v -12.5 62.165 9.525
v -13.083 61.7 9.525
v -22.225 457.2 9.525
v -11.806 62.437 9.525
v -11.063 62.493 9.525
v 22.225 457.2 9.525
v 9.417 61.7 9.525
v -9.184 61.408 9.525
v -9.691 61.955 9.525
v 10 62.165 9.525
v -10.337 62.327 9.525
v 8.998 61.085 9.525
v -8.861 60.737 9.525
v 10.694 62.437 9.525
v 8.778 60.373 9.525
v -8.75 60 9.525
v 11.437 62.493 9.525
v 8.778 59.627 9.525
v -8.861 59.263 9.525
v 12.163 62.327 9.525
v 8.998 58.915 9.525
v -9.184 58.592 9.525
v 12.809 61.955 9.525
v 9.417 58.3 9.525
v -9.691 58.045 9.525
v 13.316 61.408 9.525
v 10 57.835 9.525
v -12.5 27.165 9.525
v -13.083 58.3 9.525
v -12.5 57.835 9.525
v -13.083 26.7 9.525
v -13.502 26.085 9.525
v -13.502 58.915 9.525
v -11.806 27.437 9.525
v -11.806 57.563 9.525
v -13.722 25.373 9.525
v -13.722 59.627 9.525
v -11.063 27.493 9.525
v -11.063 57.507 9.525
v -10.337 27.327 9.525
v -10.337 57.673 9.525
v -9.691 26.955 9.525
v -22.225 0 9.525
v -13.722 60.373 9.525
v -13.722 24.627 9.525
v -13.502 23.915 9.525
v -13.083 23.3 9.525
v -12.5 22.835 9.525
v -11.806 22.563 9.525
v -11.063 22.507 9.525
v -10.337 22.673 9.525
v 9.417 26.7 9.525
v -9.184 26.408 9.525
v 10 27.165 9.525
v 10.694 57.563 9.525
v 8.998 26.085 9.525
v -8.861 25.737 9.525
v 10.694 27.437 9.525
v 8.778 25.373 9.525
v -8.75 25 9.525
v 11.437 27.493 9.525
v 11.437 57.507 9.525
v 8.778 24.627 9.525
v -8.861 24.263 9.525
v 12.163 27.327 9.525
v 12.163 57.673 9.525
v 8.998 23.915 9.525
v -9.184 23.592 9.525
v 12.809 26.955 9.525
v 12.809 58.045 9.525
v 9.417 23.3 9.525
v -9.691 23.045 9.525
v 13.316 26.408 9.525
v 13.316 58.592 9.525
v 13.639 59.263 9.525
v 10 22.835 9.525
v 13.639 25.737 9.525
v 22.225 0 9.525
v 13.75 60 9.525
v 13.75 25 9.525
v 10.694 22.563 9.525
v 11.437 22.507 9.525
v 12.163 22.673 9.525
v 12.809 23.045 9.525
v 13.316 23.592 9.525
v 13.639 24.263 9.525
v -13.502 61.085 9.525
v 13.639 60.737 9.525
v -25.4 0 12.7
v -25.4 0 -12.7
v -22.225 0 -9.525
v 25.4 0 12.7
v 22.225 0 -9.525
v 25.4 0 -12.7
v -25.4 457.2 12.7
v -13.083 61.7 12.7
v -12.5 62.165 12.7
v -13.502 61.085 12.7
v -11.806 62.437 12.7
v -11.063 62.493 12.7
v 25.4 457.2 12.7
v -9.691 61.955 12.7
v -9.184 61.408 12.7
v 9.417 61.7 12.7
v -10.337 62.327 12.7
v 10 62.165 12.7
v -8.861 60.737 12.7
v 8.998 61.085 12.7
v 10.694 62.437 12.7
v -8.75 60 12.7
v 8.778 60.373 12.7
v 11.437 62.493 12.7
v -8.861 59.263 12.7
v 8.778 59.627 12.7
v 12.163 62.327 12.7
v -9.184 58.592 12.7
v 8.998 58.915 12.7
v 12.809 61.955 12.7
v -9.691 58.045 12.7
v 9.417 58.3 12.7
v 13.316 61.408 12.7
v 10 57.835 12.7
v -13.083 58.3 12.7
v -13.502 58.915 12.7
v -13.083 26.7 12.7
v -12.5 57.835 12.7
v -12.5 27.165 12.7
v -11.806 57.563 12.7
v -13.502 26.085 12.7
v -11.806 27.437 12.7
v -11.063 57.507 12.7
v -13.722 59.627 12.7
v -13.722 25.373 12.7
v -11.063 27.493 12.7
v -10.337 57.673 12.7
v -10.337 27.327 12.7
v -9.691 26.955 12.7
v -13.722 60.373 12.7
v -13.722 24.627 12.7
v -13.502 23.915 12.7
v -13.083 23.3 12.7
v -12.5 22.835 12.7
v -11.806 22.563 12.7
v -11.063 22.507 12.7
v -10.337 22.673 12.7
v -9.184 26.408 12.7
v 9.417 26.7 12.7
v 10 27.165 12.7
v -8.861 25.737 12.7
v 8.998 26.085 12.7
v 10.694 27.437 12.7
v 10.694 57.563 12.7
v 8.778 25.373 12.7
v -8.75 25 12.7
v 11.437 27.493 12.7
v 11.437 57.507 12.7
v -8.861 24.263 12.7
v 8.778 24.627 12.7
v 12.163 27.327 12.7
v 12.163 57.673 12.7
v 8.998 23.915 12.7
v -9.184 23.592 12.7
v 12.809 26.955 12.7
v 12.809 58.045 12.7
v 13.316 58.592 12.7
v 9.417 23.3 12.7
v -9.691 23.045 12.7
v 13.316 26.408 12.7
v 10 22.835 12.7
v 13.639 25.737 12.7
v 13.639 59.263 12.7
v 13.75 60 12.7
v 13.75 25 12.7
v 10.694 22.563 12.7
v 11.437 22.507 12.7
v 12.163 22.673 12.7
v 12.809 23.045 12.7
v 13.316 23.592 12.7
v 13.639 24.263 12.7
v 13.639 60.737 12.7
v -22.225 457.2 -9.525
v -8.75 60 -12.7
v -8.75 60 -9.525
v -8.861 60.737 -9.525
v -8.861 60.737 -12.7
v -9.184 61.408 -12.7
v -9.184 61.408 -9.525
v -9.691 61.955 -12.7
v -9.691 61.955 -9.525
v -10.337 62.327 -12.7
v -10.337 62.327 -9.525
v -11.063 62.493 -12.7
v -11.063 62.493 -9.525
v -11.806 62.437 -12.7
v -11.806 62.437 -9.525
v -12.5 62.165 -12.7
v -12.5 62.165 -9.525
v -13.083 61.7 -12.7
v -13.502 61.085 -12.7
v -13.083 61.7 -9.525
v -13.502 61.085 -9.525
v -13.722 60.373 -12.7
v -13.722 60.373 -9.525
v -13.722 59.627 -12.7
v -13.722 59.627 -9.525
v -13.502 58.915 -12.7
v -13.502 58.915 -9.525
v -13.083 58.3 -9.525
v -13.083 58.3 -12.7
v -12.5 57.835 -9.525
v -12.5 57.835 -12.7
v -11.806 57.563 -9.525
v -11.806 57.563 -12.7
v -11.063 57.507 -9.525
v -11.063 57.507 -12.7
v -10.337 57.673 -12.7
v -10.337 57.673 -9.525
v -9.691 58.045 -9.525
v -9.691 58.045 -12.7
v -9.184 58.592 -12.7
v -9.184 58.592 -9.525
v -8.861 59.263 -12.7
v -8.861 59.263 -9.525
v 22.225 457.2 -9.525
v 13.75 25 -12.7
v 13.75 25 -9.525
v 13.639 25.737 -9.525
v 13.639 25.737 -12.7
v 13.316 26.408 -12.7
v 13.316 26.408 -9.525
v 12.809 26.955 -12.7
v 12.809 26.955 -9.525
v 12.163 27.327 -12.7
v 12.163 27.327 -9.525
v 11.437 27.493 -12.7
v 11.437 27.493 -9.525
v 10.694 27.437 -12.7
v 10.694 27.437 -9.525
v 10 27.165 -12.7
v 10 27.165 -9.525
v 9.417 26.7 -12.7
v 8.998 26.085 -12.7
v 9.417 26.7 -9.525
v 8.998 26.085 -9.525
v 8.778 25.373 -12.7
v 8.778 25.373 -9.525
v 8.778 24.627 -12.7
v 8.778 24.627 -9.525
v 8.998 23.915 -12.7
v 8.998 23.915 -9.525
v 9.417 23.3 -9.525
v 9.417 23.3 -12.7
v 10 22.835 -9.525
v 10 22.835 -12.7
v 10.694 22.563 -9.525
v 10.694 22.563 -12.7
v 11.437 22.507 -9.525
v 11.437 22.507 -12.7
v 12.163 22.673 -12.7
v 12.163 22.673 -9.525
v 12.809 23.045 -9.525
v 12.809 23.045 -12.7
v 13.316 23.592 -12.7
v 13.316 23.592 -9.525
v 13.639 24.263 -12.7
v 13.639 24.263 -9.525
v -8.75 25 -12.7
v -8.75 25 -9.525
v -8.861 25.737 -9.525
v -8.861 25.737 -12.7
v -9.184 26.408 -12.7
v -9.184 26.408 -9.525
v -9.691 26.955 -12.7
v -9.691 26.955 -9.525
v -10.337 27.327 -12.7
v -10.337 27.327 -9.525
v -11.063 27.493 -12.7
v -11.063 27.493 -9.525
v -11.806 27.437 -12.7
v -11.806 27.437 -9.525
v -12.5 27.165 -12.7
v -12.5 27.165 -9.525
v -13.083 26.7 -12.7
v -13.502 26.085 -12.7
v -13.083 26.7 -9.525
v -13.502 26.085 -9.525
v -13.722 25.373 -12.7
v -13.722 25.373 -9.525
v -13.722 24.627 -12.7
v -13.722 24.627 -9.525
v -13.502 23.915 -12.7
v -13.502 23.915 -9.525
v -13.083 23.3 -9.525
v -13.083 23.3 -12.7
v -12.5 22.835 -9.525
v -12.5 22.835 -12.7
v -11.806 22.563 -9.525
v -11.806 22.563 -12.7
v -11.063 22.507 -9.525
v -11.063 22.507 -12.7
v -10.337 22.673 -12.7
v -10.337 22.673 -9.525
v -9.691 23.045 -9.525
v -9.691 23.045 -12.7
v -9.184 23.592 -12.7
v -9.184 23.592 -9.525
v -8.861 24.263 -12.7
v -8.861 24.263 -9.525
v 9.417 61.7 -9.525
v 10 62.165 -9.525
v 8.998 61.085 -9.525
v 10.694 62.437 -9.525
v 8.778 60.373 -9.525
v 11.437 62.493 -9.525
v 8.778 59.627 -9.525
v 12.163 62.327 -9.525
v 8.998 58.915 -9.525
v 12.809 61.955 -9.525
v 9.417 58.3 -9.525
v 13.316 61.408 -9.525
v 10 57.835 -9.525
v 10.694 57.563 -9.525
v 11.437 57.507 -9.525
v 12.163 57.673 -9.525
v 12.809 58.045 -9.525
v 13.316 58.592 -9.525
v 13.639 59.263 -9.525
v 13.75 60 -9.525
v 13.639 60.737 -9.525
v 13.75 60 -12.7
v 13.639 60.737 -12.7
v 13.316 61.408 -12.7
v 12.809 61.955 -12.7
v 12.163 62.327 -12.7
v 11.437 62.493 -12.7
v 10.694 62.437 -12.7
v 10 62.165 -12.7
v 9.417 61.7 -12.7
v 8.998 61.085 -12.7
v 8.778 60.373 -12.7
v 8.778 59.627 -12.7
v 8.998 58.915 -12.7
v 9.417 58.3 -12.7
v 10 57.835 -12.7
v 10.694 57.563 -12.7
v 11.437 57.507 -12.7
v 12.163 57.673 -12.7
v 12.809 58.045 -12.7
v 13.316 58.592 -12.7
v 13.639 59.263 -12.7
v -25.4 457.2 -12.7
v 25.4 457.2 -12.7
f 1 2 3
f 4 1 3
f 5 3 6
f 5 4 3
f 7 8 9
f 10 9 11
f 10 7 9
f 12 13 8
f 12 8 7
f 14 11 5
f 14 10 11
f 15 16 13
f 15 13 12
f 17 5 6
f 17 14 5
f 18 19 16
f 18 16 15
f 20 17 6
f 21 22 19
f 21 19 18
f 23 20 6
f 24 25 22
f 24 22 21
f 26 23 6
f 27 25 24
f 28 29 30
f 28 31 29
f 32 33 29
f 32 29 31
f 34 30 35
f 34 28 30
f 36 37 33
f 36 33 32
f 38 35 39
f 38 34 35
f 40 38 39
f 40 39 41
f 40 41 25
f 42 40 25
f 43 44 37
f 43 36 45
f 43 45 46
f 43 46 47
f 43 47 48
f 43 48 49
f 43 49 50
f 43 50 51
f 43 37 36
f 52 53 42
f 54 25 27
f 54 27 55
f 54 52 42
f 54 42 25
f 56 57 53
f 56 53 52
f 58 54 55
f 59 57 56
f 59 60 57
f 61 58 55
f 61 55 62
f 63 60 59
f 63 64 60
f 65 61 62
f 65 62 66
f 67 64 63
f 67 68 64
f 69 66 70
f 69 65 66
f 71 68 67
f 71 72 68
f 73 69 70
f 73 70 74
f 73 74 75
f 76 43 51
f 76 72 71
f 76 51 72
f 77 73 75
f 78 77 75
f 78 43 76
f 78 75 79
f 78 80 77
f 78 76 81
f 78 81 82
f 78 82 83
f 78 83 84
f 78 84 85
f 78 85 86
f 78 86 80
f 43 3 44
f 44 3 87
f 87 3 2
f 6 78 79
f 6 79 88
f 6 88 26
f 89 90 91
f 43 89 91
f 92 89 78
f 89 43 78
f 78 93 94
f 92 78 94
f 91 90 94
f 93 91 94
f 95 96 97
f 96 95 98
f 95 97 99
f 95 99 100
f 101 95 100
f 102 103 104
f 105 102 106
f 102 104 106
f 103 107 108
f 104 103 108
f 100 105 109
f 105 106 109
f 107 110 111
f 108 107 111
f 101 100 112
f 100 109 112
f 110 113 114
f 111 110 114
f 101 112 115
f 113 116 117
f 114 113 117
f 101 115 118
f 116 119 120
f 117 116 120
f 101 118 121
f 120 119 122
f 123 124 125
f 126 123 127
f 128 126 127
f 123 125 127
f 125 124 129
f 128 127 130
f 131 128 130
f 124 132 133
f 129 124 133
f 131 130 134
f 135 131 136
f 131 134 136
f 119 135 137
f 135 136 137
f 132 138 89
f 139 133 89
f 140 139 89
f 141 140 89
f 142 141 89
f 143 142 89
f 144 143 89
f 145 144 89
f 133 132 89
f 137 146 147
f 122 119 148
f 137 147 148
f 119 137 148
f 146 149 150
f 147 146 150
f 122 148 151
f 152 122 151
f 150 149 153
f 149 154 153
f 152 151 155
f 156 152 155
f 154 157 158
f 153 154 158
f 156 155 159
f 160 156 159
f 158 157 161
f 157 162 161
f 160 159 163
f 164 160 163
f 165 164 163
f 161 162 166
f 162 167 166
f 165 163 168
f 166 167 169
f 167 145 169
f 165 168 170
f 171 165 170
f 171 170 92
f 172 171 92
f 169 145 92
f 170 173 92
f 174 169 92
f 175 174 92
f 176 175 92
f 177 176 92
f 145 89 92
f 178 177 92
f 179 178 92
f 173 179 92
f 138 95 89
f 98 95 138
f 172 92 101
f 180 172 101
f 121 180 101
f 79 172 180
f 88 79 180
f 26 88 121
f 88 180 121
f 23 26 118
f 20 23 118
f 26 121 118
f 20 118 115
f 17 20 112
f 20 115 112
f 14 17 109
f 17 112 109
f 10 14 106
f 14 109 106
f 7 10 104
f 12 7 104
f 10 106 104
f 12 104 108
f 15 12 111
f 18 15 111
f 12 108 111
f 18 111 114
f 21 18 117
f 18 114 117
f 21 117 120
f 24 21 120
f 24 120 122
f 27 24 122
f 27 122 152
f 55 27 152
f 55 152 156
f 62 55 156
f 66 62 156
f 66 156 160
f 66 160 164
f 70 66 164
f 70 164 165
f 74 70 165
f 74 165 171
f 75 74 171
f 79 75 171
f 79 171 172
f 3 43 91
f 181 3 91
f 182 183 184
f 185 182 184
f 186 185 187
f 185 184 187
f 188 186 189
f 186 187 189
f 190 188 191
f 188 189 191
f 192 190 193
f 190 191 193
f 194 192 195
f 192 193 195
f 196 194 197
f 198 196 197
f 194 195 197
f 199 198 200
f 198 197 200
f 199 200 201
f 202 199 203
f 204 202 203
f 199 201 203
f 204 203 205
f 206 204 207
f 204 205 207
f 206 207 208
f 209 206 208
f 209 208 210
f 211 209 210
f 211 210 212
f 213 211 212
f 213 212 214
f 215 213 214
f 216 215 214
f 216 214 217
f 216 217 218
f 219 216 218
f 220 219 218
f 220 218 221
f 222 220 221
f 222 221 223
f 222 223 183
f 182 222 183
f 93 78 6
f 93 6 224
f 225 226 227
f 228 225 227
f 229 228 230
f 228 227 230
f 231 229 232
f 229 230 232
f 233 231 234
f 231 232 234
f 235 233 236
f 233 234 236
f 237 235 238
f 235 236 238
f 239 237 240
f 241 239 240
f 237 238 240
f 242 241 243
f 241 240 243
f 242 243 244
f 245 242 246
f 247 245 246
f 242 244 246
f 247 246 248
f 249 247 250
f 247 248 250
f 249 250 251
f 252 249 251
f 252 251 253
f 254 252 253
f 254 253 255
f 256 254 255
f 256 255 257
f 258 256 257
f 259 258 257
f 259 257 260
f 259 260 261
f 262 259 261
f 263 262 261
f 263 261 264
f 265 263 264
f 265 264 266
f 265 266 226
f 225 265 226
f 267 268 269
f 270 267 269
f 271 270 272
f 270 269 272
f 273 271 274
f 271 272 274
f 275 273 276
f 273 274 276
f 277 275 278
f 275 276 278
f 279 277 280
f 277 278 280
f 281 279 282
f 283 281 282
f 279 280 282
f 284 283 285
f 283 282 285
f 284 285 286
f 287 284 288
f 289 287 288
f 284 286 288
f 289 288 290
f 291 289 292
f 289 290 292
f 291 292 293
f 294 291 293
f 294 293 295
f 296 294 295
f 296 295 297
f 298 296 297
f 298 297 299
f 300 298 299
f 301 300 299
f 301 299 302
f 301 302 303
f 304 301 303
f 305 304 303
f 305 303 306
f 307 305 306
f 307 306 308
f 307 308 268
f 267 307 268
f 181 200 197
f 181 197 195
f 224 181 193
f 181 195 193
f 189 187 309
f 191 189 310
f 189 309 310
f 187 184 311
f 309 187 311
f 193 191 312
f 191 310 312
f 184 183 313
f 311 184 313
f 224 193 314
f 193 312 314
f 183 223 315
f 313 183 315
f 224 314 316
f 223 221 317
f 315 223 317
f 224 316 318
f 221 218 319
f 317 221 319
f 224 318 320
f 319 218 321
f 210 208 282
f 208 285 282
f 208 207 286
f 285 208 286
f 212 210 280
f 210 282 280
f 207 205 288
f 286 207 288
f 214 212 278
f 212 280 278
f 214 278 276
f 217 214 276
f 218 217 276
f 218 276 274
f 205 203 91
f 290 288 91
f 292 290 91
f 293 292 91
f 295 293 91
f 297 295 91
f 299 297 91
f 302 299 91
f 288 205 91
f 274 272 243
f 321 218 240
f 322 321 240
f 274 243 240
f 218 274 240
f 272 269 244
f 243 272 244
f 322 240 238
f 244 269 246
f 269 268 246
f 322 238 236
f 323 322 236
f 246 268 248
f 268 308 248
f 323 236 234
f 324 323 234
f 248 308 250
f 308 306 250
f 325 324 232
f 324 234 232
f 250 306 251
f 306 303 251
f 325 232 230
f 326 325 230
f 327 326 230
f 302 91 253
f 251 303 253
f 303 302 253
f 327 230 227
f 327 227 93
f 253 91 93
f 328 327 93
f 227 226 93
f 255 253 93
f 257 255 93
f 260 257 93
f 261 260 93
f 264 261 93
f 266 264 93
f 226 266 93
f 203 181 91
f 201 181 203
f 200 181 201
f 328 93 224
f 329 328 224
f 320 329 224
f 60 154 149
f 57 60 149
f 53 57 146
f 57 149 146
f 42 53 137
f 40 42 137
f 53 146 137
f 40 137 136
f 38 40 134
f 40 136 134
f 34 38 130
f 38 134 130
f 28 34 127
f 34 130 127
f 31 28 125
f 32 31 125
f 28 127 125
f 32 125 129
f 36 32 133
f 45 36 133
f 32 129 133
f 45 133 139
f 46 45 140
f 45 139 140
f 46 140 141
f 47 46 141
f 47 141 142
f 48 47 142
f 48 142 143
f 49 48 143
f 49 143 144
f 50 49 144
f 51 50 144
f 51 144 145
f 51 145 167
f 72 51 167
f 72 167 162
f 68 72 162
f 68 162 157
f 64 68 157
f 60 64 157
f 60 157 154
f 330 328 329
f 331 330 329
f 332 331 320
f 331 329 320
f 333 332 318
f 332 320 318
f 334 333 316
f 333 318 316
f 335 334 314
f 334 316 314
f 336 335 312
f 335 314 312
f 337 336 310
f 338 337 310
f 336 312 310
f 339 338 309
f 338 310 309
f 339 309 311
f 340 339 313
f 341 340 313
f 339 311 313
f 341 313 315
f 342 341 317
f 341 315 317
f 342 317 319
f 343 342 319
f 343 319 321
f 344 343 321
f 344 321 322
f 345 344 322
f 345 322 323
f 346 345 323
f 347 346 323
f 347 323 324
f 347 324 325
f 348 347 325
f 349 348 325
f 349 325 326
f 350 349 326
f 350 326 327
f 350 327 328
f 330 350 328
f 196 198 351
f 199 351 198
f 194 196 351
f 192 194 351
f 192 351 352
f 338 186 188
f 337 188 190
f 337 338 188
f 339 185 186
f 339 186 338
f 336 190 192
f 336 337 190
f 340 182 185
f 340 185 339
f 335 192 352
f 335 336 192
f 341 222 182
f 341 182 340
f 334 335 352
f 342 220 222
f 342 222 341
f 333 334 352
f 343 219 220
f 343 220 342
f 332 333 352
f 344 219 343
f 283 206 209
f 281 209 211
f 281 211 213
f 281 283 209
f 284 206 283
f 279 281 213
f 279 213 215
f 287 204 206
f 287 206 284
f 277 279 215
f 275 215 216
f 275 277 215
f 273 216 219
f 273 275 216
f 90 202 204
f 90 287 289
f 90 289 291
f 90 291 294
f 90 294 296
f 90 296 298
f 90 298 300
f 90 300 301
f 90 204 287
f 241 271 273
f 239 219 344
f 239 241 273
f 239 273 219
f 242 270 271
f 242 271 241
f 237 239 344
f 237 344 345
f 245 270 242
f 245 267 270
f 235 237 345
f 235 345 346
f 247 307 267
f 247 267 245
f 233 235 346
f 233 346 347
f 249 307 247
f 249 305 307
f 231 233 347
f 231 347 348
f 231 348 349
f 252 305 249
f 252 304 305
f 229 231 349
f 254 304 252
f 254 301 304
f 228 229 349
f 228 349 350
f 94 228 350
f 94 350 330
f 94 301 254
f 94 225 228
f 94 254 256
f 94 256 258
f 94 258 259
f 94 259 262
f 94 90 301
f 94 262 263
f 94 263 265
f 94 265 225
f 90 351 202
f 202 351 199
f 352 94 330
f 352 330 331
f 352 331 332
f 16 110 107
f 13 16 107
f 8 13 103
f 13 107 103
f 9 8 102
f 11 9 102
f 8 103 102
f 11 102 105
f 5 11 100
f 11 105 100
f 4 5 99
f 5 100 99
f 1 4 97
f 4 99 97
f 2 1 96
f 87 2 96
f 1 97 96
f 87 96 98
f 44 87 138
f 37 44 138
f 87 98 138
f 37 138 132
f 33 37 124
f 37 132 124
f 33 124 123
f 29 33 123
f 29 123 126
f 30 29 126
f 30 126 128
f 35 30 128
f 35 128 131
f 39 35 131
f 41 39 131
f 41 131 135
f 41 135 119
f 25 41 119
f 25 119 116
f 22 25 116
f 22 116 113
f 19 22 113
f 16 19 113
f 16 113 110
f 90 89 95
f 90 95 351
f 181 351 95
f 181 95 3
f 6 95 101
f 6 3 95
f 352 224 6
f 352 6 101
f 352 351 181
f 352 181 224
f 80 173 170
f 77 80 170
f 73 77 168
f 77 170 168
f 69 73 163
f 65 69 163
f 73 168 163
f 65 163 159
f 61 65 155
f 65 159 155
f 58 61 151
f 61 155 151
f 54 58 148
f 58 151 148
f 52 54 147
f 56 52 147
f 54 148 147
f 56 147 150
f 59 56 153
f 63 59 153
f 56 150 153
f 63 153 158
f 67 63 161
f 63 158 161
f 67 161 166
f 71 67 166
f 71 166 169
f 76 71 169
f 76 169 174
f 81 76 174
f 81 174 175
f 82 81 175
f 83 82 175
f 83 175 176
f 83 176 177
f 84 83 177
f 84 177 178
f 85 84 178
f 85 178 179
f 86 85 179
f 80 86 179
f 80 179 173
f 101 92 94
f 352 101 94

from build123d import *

# Parameters (mm, degrees)
SKETCH1_W           = 50.8
SKETCH1_H           = 25.4
SKETCH1_W_2         = 44.45
SKETCH1_H_2         = 19.05
BOSS_EXTRUDE1_DEPTH = 457.2
SKETCH2_R           = 2.5
CUT_EXTRUDE1_DEPTH  = 459.608940166


with BuildPart() as part:
    # Sketch1 → Boss-Extrude1 (new body)
    with BuildSketch(Plane(origin=(0, 0, 0), x_dir=(1, 0, 0), z_dir=(0, 1, 0))):
        Rectangle(SKETCH1_W, SKETCH1_H)
        Rectangle(SKETCH1_W_2, SKETCH1_H_2, mode=Mode.SUBTRACT)
    extrude(amount=BOSS_EXTRUDE1_DEPTH)

    # Sketch2 → Cut-Extrude1 (cut, through all)
    with BuildSketch(Plane.XY.offset(12.7)):
        with Locations((-11.25, 60)):
            Circle(SKETCH2_R)
        with Locations((-11.25, 25)):
            Circle(SKETCH2_R)
        with Locations((11.25, 25)):
            Circle(SKETCH2_R)
        with Locations((11.25, 60)):
            Circle(SKETCH2_R)
    extrude(amount=-CUT_EXTRUDE1_DEPTH, mode=Mode.SUBTRACT)


solid = part.part
